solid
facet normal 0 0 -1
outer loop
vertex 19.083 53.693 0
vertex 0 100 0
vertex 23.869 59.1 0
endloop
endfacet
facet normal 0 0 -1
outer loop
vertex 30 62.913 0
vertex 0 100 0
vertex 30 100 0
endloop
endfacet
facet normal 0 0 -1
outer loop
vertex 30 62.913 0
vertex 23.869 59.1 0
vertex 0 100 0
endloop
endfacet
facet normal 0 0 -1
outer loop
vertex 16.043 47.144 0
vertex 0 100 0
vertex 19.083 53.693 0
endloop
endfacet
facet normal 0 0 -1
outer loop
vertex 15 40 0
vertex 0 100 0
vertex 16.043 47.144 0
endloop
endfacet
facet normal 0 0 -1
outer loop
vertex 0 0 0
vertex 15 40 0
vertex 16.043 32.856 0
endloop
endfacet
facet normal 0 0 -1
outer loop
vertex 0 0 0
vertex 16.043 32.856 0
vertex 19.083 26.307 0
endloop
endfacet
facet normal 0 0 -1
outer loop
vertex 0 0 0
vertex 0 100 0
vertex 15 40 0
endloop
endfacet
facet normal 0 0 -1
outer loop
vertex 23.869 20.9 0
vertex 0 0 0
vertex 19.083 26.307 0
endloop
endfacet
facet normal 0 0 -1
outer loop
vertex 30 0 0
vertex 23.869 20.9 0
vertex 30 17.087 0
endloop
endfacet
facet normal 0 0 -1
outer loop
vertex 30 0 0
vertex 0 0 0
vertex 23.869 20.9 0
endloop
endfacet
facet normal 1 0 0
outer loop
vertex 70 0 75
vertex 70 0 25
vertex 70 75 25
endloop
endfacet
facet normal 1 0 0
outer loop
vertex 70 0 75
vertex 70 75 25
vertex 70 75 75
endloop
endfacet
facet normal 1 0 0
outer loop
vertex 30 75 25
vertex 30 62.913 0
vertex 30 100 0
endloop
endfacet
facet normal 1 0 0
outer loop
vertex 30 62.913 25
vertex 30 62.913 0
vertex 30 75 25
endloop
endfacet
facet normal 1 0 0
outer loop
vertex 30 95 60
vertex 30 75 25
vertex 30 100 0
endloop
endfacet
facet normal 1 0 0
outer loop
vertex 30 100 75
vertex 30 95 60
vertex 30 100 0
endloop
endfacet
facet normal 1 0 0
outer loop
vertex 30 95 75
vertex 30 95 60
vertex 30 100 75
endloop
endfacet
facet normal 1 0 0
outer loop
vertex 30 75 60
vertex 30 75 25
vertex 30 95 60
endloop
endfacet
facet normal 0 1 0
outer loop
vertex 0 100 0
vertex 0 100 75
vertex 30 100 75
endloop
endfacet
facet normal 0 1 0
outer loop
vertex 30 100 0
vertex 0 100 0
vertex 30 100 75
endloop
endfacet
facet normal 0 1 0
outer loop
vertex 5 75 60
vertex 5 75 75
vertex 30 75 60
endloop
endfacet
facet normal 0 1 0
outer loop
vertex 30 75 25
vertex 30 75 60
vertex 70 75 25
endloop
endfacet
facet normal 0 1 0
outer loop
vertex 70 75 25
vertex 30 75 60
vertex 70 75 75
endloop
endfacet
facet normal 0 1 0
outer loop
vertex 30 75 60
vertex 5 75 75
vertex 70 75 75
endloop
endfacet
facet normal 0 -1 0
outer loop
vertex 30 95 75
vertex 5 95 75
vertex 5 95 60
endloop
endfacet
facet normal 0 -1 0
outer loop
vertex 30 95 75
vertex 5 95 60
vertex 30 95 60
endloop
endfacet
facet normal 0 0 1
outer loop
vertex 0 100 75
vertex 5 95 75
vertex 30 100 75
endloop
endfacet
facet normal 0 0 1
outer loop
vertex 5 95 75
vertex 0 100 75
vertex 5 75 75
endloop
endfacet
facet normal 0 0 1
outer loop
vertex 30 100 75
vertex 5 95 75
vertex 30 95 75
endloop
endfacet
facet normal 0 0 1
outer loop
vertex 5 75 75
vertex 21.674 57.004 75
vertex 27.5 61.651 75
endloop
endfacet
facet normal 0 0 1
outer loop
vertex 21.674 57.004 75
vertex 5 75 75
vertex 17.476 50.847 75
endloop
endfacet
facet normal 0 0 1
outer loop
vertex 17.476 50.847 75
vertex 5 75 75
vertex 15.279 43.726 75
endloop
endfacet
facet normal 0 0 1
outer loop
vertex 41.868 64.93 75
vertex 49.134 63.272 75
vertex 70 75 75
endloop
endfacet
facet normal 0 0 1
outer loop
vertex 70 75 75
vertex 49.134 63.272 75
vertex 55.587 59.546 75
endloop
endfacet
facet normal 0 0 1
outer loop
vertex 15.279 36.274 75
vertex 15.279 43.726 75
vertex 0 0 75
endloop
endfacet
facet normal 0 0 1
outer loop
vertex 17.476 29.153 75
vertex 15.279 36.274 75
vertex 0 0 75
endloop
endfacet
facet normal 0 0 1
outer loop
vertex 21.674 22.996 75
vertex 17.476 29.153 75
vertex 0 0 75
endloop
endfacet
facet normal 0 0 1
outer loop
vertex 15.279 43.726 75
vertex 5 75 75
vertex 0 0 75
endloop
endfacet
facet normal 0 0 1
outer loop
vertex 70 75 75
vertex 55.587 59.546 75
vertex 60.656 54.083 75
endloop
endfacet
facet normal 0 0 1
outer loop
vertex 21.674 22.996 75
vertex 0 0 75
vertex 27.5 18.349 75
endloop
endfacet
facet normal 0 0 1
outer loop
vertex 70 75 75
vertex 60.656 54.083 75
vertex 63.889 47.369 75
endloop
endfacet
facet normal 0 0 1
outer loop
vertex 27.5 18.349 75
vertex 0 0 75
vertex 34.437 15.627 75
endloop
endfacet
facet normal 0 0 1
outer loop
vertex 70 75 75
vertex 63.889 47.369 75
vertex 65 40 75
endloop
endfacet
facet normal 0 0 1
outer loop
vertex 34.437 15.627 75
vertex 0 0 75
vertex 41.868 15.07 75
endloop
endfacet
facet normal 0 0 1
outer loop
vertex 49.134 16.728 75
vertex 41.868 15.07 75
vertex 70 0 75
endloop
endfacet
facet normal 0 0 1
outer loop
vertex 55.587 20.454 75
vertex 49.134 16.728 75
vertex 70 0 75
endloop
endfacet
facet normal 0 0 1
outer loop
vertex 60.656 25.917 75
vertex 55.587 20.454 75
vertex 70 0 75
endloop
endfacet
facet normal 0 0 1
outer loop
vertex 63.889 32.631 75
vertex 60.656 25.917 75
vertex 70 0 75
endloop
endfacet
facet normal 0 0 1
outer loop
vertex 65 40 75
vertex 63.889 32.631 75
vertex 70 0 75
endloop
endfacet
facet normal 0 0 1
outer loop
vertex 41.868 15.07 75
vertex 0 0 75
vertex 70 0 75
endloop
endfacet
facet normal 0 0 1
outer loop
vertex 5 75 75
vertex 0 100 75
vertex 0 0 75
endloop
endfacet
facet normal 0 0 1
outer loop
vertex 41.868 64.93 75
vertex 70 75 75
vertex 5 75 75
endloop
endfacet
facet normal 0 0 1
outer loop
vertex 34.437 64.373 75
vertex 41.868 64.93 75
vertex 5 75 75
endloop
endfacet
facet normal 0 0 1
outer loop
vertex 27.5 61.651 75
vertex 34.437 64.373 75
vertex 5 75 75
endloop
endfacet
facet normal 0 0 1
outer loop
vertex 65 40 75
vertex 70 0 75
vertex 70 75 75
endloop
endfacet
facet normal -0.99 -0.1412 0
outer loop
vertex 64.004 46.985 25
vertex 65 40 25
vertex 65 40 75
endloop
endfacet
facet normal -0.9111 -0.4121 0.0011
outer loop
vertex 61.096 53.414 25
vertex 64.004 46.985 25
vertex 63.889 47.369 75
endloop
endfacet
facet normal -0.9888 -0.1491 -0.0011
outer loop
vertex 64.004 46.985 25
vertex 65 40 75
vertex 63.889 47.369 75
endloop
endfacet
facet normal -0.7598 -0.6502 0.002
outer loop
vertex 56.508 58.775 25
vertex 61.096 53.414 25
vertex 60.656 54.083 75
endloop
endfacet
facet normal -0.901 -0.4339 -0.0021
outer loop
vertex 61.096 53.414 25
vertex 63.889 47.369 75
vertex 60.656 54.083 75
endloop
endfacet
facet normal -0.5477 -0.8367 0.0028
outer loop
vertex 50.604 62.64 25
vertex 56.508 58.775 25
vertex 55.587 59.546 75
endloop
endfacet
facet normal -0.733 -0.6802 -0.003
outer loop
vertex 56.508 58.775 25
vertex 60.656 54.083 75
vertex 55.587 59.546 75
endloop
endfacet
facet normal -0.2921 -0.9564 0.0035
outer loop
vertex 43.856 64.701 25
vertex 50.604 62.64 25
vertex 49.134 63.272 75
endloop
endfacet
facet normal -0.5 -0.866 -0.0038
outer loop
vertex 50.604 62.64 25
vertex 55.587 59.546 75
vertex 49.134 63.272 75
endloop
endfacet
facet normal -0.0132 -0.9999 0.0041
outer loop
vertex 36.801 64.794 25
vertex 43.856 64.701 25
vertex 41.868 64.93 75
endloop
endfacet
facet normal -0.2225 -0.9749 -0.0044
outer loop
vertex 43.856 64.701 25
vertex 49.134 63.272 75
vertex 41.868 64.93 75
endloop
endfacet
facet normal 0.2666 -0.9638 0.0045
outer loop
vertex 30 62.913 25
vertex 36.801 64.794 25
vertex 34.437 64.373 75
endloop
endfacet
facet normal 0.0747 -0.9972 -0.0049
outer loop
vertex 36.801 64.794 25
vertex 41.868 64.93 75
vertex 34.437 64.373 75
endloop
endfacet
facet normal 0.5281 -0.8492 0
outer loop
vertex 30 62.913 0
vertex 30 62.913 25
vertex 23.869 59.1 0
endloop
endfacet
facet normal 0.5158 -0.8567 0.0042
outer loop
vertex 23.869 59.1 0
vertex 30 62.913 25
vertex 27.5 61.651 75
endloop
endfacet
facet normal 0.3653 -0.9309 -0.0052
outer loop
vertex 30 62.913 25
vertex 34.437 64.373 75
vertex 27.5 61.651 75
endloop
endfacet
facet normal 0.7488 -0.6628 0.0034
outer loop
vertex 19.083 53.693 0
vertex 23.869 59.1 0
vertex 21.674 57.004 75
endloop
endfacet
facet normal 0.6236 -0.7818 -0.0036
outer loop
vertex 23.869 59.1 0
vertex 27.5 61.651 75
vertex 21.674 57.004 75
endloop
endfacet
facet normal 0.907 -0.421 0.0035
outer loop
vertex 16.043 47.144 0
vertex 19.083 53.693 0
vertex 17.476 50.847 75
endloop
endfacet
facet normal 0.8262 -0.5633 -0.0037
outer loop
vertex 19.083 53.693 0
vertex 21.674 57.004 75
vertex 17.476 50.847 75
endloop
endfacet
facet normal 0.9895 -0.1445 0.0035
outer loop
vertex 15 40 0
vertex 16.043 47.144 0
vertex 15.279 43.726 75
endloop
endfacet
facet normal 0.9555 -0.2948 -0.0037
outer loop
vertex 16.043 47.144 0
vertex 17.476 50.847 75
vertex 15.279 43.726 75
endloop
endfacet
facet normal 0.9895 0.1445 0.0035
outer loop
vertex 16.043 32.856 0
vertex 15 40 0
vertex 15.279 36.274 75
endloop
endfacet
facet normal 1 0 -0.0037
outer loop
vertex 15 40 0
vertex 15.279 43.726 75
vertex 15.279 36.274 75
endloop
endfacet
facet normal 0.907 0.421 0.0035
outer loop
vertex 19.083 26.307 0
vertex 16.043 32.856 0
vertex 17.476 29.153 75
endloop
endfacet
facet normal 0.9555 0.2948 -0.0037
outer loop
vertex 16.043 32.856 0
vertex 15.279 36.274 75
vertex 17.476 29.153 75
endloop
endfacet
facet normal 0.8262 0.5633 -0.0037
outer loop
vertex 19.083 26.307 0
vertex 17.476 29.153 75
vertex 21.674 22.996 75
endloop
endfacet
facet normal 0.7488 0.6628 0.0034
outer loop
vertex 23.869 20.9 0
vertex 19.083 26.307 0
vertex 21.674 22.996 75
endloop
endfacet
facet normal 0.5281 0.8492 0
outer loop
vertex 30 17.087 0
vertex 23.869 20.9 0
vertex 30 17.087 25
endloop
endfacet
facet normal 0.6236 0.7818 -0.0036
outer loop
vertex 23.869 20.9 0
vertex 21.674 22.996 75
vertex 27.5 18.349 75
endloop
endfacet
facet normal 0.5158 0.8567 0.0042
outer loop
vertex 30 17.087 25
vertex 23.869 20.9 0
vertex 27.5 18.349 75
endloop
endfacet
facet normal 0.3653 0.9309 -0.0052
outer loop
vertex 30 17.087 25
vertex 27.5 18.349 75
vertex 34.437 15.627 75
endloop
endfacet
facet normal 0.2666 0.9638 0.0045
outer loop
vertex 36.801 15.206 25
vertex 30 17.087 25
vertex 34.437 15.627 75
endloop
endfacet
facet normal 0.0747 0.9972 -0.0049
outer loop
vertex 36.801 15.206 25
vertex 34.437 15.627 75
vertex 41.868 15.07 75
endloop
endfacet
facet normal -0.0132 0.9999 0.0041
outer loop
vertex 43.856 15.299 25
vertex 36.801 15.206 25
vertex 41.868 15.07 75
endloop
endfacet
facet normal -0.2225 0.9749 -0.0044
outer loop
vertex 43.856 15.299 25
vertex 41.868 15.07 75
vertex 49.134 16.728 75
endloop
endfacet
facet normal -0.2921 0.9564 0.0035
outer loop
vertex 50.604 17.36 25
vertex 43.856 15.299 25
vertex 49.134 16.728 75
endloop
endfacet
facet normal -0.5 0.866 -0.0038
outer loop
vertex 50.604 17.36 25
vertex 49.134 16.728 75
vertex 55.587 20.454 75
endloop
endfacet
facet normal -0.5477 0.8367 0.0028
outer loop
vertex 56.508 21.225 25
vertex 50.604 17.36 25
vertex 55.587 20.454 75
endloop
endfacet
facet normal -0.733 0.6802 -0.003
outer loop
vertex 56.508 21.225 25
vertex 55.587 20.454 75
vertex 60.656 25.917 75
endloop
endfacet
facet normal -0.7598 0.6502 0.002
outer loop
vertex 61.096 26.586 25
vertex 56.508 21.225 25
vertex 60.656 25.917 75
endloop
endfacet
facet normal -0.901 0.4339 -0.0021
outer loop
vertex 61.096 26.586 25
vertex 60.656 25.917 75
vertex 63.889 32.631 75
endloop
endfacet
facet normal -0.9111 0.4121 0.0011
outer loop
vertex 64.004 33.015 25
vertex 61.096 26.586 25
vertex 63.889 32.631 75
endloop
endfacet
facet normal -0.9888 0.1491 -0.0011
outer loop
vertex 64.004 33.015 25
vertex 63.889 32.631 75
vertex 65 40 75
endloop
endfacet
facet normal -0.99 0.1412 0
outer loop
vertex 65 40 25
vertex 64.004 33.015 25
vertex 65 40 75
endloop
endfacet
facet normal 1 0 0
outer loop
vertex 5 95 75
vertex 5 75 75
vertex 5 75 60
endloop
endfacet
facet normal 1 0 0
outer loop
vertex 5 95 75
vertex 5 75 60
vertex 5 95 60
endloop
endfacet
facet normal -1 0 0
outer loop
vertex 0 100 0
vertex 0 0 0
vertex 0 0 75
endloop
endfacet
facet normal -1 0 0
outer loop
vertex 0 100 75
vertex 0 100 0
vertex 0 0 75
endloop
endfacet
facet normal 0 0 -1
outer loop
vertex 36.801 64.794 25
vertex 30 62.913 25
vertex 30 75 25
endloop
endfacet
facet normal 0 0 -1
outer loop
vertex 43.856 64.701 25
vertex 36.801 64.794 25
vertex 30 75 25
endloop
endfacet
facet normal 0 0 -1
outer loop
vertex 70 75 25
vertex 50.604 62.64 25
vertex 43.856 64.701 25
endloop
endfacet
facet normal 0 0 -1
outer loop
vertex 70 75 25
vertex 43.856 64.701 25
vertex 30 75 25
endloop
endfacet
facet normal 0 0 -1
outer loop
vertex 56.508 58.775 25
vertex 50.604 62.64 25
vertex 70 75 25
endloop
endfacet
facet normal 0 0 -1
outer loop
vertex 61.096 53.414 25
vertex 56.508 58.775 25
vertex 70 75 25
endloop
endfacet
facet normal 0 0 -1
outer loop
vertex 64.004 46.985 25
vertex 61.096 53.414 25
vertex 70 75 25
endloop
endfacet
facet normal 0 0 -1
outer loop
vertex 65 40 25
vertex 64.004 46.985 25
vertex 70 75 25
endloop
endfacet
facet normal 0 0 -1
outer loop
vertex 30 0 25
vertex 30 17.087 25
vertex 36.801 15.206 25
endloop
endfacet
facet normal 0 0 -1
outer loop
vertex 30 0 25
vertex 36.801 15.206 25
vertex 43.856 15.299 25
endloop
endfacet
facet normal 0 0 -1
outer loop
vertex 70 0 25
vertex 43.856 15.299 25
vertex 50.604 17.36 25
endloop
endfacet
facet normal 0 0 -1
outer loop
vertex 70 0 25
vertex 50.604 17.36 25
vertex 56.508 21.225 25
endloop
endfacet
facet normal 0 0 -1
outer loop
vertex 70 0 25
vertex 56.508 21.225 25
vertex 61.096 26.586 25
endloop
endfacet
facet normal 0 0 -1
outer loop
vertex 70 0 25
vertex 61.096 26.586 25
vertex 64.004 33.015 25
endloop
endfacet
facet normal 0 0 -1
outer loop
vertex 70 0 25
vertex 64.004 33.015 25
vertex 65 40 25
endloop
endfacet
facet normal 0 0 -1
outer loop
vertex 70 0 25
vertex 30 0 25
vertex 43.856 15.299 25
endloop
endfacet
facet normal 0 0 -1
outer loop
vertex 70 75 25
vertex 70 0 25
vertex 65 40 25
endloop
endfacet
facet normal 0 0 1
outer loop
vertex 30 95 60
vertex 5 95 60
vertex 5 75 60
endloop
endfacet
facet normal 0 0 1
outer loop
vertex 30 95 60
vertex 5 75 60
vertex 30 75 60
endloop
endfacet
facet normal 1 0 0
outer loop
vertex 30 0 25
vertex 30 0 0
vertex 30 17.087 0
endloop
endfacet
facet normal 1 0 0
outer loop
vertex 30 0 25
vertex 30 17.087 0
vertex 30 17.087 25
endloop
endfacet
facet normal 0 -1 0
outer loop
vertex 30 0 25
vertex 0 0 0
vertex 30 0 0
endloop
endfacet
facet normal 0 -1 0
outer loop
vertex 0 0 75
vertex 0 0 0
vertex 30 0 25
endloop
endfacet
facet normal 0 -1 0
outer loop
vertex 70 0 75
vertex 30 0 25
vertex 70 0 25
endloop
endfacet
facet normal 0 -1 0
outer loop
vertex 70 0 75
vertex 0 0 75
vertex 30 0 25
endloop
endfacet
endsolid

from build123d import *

# Parameters (mm, degrees)
F0_W     = 70
F0_H     = 75
F1_DEPTH = 100
F2_W     = 40
F2_H     = 25
F3_DEPTH = 100.001
F4_W     = 40
F4_H     = 25
F5_DEPTH = 75.001
F6_R     = 25
F7_DEPTH = 75.001
F8_W     = 25
F8_H     = 20
F9_DEPTH = 15


with BuildPart() as f1:
    # F0 (on Front) → F1 (new body)
    with BuildSketch(Plane.XZ):
        with Locations((35, 37.5)):
            Rectangle(F0_W, F0_H)
    extrude(amount=-F1_DEPTH)

    # F2 (on face) → F3 (cut, through all)
    with BuildSketch(Plane.XZ):
        with Locations((50, 12.5)):
            Rectangle(F2_W, F2_H)
    extrude(amount=-F3_DEPTH, mode=Mode.SUBTRACT)

    # F4 (on face) → F5 (cut, through all)
    with BuildSketch(Plane.XY.offset(75)):
        with Locations((50, 87.5)):
            Rectangle(F4_W, F4_H)
    extrude(amount=-F5_DEPTH, mode=Mode.SUBTRACT)

    # F6 (on face) → F7 (cut, through all)
    with BuildSketch(Plane.XY.offset(75)):
        with Locations((40, 40)):
            Circle(F6_R)
    extrude(amount=-F7_DEPTH, mode=Mode.SUBTRACT)

    # F8 (on face) → F9 (cut)
    with BuildSketch(Plane.XY.offset(75)):
        with Locations((17.5, 85)):
            Rectangle(F8_W, F8_H)
    extrude(amount=-F9_DEPTH, mode=Mode.SUBTRACT)


solid = f1.part
